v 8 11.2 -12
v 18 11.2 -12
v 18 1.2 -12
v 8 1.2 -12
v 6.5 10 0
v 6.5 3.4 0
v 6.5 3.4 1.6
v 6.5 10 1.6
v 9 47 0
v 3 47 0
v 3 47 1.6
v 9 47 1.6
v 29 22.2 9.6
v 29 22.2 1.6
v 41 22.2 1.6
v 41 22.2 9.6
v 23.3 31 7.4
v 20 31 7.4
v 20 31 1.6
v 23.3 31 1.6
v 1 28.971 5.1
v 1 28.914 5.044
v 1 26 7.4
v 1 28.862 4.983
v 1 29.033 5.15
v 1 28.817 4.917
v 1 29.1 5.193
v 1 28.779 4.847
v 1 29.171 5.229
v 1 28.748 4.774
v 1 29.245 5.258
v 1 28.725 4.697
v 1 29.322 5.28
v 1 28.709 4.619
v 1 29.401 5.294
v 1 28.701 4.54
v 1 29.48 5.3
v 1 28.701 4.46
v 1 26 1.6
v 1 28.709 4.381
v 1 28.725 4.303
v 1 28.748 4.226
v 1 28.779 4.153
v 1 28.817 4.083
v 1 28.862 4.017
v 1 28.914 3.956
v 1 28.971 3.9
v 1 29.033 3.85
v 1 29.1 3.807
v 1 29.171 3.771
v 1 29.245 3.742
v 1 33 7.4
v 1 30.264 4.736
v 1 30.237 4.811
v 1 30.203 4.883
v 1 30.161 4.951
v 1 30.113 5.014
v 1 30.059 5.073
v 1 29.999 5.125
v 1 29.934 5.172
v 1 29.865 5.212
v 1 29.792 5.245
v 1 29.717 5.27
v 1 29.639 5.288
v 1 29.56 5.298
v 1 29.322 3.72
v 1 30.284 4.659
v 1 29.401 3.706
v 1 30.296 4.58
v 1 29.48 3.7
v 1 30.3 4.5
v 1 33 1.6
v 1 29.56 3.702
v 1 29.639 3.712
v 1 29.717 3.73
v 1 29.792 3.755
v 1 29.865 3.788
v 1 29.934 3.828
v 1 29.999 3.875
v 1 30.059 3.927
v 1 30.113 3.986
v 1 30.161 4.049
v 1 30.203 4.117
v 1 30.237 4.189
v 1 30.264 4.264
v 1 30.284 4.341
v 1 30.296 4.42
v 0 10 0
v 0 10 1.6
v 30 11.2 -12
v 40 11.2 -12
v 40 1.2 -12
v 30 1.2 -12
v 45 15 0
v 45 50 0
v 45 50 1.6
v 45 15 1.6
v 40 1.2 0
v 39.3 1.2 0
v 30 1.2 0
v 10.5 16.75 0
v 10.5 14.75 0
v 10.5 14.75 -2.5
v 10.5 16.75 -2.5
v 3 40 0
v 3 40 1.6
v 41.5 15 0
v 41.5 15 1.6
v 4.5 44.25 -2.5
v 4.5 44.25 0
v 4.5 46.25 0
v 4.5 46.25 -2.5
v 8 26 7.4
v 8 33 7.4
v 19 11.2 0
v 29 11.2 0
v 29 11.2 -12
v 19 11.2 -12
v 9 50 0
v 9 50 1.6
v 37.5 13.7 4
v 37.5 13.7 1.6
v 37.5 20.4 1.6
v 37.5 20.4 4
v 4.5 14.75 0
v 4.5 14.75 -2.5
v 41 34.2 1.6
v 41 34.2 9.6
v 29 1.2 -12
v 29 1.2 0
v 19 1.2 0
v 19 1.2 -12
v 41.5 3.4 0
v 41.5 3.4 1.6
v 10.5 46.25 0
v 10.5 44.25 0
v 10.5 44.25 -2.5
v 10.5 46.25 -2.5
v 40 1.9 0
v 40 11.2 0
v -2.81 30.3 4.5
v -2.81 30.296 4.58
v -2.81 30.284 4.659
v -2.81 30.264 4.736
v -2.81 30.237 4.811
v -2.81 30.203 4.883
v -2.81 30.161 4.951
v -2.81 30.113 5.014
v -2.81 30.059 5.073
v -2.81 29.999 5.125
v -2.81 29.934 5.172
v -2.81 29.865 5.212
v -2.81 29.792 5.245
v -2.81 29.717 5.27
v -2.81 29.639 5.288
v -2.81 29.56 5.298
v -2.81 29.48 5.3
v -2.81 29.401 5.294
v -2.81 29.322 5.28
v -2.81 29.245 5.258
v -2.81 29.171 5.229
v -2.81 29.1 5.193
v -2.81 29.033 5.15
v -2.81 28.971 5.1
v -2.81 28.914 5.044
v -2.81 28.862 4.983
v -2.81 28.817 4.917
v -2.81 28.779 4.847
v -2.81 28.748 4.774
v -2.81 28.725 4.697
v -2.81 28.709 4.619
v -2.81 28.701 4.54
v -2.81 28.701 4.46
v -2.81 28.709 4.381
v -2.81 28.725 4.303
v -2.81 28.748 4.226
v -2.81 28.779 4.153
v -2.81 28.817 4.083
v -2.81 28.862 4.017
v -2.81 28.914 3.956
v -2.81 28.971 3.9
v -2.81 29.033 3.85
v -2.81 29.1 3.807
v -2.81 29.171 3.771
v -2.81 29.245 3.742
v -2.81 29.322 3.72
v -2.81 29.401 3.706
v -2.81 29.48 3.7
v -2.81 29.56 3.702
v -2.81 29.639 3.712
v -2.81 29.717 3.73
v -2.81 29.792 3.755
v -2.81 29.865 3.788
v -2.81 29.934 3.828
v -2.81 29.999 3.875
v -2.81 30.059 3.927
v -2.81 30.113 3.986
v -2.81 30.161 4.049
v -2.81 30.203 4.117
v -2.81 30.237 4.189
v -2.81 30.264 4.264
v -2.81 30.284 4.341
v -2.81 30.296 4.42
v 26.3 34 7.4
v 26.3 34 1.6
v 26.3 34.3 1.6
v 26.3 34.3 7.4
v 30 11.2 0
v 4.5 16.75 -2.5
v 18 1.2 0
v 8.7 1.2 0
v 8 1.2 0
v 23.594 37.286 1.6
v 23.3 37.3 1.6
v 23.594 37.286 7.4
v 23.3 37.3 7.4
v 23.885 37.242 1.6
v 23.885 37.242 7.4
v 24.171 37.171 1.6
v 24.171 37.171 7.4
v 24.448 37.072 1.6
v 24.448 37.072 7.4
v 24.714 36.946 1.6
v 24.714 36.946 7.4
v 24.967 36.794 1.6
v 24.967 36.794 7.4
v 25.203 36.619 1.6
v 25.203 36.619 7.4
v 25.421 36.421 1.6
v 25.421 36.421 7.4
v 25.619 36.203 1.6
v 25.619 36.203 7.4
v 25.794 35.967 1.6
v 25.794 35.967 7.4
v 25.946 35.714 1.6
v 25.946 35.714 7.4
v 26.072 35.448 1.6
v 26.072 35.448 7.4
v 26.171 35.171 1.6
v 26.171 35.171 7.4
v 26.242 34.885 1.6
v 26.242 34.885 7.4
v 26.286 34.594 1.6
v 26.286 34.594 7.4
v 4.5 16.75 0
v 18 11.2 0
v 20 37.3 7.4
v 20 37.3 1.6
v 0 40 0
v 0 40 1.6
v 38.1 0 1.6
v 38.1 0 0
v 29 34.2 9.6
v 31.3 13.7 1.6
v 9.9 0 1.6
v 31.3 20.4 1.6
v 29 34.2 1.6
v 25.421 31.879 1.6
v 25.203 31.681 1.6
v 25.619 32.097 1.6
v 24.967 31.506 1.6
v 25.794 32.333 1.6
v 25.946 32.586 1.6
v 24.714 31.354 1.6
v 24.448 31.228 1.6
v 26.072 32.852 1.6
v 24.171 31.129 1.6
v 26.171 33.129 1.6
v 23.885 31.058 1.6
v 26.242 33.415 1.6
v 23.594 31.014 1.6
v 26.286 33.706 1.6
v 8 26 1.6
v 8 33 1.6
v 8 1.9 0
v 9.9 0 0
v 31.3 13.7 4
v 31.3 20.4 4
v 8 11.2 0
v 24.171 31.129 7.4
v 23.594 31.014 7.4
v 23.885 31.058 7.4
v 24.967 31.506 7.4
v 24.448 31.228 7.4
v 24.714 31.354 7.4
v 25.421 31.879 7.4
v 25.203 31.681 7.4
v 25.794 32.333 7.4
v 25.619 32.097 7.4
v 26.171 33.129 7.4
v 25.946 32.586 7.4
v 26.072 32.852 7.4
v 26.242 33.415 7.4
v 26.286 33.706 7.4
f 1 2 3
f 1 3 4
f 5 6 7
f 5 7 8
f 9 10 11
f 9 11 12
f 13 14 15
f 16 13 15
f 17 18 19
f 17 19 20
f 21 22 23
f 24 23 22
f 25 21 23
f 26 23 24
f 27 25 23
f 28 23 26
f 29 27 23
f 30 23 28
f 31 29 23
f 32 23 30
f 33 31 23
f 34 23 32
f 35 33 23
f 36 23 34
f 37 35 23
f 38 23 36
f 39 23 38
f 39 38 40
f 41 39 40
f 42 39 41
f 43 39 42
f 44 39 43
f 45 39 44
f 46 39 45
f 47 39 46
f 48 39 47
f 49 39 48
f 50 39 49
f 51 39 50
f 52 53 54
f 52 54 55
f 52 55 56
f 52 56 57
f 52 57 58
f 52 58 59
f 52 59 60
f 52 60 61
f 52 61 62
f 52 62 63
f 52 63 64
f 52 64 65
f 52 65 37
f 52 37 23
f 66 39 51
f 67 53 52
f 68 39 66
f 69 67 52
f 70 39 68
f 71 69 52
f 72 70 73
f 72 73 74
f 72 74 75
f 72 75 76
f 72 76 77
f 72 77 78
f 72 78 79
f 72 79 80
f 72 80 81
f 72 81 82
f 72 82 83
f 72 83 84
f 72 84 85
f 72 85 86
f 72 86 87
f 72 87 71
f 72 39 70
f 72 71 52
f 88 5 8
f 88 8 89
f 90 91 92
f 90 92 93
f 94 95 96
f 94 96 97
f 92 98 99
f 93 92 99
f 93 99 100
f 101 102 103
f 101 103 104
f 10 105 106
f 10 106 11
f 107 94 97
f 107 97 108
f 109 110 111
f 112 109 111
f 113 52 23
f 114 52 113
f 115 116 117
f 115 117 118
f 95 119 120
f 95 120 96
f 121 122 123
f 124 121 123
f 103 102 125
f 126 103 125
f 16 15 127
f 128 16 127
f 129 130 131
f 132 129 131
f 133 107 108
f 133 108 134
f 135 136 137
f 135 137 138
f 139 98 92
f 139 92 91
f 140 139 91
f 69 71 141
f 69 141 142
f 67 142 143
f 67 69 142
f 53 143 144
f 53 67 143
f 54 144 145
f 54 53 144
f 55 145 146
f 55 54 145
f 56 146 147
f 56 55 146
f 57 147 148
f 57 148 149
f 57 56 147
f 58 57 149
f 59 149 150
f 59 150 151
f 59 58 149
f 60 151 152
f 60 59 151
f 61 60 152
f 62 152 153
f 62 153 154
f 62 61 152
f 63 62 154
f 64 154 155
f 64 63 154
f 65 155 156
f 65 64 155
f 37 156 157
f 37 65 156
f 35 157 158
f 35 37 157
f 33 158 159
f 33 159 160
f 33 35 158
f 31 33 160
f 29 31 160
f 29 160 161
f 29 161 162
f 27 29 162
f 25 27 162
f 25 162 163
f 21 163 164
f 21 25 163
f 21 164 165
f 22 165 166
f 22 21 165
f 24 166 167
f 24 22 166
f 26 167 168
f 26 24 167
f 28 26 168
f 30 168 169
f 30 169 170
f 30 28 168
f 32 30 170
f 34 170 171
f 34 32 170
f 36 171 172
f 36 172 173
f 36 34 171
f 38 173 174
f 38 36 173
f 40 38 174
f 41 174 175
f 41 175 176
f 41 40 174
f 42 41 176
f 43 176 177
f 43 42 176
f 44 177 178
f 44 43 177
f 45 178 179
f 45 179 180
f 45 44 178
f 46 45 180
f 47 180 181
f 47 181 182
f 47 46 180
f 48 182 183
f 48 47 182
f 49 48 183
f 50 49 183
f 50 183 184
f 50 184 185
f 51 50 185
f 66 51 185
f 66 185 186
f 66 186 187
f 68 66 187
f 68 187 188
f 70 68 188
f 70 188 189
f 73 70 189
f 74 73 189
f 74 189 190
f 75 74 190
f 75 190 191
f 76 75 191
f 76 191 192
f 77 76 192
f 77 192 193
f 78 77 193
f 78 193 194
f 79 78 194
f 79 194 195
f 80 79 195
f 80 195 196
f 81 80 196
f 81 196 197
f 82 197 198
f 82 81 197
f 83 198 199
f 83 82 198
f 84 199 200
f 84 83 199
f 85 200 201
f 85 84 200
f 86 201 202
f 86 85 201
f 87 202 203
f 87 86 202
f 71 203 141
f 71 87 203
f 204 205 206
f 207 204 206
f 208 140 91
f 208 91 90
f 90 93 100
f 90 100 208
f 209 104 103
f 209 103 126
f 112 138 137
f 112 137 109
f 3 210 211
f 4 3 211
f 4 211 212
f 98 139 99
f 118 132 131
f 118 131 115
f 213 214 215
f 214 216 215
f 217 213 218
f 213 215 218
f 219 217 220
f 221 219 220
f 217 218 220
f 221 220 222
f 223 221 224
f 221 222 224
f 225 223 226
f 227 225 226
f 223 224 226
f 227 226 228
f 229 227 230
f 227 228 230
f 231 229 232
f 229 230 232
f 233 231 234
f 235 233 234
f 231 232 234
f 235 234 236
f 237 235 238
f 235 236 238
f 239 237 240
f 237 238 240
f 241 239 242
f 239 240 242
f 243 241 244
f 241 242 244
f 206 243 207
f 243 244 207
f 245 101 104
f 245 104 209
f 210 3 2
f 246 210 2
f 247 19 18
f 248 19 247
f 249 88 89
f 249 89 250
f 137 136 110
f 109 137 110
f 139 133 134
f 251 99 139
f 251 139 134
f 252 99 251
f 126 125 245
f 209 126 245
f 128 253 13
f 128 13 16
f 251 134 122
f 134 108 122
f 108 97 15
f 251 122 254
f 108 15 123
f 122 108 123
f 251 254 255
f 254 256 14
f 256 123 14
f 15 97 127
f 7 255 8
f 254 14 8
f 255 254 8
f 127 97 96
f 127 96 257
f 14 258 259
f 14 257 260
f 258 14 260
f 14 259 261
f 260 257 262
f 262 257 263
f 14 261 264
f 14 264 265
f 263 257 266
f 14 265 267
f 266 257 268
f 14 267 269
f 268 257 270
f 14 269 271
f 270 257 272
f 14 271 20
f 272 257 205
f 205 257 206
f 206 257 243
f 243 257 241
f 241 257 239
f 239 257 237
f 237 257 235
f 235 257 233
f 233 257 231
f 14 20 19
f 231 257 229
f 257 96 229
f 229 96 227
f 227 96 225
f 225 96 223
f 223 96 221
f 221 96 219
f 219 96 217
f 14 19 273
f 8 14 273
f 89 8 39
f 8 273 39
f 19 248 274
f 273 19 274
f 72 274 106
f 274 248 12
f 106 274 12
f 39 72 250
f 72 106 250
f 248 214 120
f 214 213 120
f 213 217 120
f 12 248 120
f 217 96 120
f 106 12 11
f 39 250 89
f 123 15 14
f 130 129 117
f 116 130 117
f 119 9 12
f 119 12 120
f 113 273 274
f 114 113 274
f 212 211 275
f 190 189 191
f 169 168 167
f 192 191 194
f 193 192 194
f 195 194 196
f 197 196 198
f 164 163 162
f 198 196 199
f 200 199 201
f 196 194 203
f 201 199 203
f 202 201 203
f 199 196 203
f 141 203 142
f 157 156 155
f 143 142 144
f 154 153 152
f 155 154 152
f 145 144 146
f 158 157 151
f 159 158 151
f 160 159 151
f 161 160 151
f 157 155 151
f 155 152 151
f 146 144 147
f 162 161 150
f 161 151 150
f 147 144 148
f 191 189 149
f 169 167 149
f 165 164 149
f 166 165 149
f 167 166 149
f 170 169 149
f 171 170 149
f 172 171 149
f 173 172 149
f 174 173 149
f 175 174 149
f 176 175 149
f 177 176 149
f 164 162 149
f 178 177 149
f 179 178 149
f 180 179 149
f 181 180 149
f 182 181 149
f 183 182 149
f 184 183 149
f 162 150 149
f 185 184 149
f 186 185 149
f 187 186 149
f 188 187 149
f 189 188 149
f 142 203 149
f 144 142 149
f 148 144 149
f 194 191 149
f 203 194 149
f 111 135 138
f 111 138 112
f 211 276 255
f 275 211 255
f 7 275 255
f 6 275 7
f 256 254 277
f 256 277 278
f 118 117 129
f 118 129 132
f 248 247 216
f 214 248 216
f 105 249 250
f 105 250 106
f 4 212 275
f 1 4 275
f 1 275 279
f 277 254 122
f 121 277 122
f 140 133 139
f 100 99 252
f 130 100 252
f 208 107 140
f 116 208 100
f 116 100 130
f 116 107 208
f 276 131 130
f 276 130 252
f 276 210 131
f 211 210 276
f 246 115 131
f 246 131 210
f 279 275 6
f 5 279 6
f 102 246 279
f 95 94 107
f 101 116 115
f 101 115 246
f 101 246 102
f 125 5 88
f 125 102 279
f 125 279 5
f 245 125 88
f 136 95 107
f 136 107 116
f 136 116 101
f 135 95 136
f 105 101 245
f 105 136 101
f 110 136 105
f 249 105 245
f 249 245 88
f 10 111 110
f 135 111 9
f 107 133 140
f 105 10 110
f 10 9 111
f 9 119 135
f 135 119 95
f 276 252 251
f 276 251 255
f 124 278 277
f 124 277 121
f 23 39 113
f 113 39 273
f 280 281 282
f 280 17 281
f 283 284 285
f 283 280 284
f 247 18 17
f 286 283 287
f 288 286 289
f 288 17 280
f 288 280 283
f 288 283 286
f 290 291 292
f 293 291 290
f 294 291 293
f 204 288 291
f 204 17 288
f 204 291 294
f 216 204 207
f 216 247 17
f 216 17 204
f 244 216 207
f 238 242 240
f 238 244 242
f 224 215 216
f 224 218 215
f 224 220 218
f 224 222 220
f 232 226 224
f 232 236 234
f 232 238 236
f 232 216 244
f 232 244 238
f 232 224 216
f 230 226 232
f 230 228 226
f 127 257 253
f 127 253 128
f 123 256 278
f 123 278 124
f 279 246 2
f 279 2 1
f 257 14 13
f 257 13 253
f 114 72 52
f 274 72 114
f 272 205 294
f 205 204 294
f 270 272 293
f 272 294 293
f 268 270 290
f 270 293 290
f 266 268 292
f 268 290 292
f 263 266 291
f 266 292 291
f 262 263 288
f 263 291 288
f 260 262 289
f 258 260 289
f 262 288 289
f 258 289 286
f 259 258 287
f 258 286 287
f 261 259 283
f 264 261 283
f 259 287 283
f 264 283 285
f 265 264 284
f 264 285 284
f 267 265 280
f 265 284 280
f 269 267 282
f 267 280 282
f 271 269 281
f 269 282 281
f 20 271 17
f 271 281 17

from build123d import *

# Parameters (mm, degrees)
EXTRUDE1_DEPTH  = 1.6
SKETCH3_W       = 6
SKETCH3_H       = 2
EXTRUDE3_DEPTH  = 2.5
SKETCH4_W       = 10
SKETCH4_H       = 10
EXTRUDE4_DEPTH  = 12
SKETCH6_W       = 7
SKETCH6_H       = 7
EXTRUDE5_DEPTH  = 5.8
SKETCH8_R       = 0.8
EXTRUDE7_DEPTH  = 3.81
SKETCH9_W       = 6.3
SKETCH9_H       = 6.3
EXTRUDE8_DEPTH  = 5.8
FILLET1_R       = 3
SKETCH10_W      = 12
SKETCH10_H      = 12
EXTRUDE9_DEPTH  = 8
SKETCH11_W      = 6.2
SKETCH11_H      = 6.7
EXTRUDE10_DEPTH = 2.4


with BuildPart() as part:
    # Sketch1 → Extrude1 (new body)
    with BuildSketch(Plane.XY):
        Polygon((41.5, 3.4), (38.1, 0), (9.9, 0), (6.5, 3.4), (6.5, 10), (0, 10), (0, 40), (3, 40), (3, 47), (9, 47), (9, 50), (45, 50), (45, 15), (41.5, 15), align=None)
    extrude(amount=EXTRUDE1_DEPTH)

    # Sketch3 → Extrude3 (add)
    with BuildSketch(Plane(origin=(0, 0, 0), x_dir=(-1, 0, 0), z_dir=(0, 0, -1))):
        with Locations((-7.5, 45.25)):
            Rectangle(SKETCH3_W, SKETCH3_H)
        with Locations((-7.5, 15.75)):
            Rectangle(SKETCH3_W, SKETCH3_H)
    extrude(amount=EXTRUDE3_DEPTH)

    # Sketch4 → Extrude4 (add)
    with BuildSketch(Plane(origin=(0, 0, 0), x_dir=(-1, 0, 0), z_dir=(0, 0, -1))):
        with Locations((-35, 6.2)):
            Rectangle(SKETCH4_W, SKETCH4_H)
        with Locations((-24, 6.2)):
            Rectangle(SKETCH4_W, SKETCH4_H)
        with Locations((-13, 6.2)):
            Rectangle(SKETCH4_W, SKETCH4_H)
    extrude(amount=EXTRUDE4_DEPTH)

    # Sketch6 → Extrude5 (add)
    with BuildSketch(Plane.XY.offset(1.6)):
        with Locations((4.5, 29.5)):
            Rectangle(SKETCH6_W, SKETCH6_H)
    extrude(amount=EXTRUDE5_DEPTH)

    # Sketch8 → Extrude7 (add)
    with BuildSketch(Plane(origin=(1, 0, 4), x_dir=(0, 0, -1), z_dir=(1, 0, 0))):
        with Locations(Location((-0.5, 29.5, 0), (0, 0, 90))):
            Circle(SKETCH8_R)
    extrude(amount=-EXTRUDE7_DEPTH)

    # Sketch9 → Extrude8 (add)
    with BuildSketch(Plane.XY.offset(1.6)):
        with Locations((23.15, 34.15)):
            Rectangle(SKETCH9_W, SKETCH9_H)
    extrude(amount=EXTRUDE8_DEPTH)

    # Fillet1
    fillet1_edges = [part.edges().sort_by_distance(p)[0] for p in [
        (26.3, 31, 4.5),
        (26.3, 37.3, 4.5),
    ]]
    fillet(fillet1_edges, radius=FILLET1_R)

    # Sketch10 → Extrude9 (add)
    with BuildSketch(Plane.XY.offset(1.6)):
        with Locations((35, 28.2)):
            Rectangle(SKETCH10_W, SKETCH10_H)
    extrude(amount=EXTRUDE9_DEPTH)

    # Sketch11 → Extrude10 (add)
    with BuildSketch(Plane.XY.offset(1.6)):
        with Locations((34.4, 17.05)):
            Rectangle(SKETCH11_W, SKETCH11_H)
    extrude(amount=EXTRUDE10_DEPTH)


solid = part.part
